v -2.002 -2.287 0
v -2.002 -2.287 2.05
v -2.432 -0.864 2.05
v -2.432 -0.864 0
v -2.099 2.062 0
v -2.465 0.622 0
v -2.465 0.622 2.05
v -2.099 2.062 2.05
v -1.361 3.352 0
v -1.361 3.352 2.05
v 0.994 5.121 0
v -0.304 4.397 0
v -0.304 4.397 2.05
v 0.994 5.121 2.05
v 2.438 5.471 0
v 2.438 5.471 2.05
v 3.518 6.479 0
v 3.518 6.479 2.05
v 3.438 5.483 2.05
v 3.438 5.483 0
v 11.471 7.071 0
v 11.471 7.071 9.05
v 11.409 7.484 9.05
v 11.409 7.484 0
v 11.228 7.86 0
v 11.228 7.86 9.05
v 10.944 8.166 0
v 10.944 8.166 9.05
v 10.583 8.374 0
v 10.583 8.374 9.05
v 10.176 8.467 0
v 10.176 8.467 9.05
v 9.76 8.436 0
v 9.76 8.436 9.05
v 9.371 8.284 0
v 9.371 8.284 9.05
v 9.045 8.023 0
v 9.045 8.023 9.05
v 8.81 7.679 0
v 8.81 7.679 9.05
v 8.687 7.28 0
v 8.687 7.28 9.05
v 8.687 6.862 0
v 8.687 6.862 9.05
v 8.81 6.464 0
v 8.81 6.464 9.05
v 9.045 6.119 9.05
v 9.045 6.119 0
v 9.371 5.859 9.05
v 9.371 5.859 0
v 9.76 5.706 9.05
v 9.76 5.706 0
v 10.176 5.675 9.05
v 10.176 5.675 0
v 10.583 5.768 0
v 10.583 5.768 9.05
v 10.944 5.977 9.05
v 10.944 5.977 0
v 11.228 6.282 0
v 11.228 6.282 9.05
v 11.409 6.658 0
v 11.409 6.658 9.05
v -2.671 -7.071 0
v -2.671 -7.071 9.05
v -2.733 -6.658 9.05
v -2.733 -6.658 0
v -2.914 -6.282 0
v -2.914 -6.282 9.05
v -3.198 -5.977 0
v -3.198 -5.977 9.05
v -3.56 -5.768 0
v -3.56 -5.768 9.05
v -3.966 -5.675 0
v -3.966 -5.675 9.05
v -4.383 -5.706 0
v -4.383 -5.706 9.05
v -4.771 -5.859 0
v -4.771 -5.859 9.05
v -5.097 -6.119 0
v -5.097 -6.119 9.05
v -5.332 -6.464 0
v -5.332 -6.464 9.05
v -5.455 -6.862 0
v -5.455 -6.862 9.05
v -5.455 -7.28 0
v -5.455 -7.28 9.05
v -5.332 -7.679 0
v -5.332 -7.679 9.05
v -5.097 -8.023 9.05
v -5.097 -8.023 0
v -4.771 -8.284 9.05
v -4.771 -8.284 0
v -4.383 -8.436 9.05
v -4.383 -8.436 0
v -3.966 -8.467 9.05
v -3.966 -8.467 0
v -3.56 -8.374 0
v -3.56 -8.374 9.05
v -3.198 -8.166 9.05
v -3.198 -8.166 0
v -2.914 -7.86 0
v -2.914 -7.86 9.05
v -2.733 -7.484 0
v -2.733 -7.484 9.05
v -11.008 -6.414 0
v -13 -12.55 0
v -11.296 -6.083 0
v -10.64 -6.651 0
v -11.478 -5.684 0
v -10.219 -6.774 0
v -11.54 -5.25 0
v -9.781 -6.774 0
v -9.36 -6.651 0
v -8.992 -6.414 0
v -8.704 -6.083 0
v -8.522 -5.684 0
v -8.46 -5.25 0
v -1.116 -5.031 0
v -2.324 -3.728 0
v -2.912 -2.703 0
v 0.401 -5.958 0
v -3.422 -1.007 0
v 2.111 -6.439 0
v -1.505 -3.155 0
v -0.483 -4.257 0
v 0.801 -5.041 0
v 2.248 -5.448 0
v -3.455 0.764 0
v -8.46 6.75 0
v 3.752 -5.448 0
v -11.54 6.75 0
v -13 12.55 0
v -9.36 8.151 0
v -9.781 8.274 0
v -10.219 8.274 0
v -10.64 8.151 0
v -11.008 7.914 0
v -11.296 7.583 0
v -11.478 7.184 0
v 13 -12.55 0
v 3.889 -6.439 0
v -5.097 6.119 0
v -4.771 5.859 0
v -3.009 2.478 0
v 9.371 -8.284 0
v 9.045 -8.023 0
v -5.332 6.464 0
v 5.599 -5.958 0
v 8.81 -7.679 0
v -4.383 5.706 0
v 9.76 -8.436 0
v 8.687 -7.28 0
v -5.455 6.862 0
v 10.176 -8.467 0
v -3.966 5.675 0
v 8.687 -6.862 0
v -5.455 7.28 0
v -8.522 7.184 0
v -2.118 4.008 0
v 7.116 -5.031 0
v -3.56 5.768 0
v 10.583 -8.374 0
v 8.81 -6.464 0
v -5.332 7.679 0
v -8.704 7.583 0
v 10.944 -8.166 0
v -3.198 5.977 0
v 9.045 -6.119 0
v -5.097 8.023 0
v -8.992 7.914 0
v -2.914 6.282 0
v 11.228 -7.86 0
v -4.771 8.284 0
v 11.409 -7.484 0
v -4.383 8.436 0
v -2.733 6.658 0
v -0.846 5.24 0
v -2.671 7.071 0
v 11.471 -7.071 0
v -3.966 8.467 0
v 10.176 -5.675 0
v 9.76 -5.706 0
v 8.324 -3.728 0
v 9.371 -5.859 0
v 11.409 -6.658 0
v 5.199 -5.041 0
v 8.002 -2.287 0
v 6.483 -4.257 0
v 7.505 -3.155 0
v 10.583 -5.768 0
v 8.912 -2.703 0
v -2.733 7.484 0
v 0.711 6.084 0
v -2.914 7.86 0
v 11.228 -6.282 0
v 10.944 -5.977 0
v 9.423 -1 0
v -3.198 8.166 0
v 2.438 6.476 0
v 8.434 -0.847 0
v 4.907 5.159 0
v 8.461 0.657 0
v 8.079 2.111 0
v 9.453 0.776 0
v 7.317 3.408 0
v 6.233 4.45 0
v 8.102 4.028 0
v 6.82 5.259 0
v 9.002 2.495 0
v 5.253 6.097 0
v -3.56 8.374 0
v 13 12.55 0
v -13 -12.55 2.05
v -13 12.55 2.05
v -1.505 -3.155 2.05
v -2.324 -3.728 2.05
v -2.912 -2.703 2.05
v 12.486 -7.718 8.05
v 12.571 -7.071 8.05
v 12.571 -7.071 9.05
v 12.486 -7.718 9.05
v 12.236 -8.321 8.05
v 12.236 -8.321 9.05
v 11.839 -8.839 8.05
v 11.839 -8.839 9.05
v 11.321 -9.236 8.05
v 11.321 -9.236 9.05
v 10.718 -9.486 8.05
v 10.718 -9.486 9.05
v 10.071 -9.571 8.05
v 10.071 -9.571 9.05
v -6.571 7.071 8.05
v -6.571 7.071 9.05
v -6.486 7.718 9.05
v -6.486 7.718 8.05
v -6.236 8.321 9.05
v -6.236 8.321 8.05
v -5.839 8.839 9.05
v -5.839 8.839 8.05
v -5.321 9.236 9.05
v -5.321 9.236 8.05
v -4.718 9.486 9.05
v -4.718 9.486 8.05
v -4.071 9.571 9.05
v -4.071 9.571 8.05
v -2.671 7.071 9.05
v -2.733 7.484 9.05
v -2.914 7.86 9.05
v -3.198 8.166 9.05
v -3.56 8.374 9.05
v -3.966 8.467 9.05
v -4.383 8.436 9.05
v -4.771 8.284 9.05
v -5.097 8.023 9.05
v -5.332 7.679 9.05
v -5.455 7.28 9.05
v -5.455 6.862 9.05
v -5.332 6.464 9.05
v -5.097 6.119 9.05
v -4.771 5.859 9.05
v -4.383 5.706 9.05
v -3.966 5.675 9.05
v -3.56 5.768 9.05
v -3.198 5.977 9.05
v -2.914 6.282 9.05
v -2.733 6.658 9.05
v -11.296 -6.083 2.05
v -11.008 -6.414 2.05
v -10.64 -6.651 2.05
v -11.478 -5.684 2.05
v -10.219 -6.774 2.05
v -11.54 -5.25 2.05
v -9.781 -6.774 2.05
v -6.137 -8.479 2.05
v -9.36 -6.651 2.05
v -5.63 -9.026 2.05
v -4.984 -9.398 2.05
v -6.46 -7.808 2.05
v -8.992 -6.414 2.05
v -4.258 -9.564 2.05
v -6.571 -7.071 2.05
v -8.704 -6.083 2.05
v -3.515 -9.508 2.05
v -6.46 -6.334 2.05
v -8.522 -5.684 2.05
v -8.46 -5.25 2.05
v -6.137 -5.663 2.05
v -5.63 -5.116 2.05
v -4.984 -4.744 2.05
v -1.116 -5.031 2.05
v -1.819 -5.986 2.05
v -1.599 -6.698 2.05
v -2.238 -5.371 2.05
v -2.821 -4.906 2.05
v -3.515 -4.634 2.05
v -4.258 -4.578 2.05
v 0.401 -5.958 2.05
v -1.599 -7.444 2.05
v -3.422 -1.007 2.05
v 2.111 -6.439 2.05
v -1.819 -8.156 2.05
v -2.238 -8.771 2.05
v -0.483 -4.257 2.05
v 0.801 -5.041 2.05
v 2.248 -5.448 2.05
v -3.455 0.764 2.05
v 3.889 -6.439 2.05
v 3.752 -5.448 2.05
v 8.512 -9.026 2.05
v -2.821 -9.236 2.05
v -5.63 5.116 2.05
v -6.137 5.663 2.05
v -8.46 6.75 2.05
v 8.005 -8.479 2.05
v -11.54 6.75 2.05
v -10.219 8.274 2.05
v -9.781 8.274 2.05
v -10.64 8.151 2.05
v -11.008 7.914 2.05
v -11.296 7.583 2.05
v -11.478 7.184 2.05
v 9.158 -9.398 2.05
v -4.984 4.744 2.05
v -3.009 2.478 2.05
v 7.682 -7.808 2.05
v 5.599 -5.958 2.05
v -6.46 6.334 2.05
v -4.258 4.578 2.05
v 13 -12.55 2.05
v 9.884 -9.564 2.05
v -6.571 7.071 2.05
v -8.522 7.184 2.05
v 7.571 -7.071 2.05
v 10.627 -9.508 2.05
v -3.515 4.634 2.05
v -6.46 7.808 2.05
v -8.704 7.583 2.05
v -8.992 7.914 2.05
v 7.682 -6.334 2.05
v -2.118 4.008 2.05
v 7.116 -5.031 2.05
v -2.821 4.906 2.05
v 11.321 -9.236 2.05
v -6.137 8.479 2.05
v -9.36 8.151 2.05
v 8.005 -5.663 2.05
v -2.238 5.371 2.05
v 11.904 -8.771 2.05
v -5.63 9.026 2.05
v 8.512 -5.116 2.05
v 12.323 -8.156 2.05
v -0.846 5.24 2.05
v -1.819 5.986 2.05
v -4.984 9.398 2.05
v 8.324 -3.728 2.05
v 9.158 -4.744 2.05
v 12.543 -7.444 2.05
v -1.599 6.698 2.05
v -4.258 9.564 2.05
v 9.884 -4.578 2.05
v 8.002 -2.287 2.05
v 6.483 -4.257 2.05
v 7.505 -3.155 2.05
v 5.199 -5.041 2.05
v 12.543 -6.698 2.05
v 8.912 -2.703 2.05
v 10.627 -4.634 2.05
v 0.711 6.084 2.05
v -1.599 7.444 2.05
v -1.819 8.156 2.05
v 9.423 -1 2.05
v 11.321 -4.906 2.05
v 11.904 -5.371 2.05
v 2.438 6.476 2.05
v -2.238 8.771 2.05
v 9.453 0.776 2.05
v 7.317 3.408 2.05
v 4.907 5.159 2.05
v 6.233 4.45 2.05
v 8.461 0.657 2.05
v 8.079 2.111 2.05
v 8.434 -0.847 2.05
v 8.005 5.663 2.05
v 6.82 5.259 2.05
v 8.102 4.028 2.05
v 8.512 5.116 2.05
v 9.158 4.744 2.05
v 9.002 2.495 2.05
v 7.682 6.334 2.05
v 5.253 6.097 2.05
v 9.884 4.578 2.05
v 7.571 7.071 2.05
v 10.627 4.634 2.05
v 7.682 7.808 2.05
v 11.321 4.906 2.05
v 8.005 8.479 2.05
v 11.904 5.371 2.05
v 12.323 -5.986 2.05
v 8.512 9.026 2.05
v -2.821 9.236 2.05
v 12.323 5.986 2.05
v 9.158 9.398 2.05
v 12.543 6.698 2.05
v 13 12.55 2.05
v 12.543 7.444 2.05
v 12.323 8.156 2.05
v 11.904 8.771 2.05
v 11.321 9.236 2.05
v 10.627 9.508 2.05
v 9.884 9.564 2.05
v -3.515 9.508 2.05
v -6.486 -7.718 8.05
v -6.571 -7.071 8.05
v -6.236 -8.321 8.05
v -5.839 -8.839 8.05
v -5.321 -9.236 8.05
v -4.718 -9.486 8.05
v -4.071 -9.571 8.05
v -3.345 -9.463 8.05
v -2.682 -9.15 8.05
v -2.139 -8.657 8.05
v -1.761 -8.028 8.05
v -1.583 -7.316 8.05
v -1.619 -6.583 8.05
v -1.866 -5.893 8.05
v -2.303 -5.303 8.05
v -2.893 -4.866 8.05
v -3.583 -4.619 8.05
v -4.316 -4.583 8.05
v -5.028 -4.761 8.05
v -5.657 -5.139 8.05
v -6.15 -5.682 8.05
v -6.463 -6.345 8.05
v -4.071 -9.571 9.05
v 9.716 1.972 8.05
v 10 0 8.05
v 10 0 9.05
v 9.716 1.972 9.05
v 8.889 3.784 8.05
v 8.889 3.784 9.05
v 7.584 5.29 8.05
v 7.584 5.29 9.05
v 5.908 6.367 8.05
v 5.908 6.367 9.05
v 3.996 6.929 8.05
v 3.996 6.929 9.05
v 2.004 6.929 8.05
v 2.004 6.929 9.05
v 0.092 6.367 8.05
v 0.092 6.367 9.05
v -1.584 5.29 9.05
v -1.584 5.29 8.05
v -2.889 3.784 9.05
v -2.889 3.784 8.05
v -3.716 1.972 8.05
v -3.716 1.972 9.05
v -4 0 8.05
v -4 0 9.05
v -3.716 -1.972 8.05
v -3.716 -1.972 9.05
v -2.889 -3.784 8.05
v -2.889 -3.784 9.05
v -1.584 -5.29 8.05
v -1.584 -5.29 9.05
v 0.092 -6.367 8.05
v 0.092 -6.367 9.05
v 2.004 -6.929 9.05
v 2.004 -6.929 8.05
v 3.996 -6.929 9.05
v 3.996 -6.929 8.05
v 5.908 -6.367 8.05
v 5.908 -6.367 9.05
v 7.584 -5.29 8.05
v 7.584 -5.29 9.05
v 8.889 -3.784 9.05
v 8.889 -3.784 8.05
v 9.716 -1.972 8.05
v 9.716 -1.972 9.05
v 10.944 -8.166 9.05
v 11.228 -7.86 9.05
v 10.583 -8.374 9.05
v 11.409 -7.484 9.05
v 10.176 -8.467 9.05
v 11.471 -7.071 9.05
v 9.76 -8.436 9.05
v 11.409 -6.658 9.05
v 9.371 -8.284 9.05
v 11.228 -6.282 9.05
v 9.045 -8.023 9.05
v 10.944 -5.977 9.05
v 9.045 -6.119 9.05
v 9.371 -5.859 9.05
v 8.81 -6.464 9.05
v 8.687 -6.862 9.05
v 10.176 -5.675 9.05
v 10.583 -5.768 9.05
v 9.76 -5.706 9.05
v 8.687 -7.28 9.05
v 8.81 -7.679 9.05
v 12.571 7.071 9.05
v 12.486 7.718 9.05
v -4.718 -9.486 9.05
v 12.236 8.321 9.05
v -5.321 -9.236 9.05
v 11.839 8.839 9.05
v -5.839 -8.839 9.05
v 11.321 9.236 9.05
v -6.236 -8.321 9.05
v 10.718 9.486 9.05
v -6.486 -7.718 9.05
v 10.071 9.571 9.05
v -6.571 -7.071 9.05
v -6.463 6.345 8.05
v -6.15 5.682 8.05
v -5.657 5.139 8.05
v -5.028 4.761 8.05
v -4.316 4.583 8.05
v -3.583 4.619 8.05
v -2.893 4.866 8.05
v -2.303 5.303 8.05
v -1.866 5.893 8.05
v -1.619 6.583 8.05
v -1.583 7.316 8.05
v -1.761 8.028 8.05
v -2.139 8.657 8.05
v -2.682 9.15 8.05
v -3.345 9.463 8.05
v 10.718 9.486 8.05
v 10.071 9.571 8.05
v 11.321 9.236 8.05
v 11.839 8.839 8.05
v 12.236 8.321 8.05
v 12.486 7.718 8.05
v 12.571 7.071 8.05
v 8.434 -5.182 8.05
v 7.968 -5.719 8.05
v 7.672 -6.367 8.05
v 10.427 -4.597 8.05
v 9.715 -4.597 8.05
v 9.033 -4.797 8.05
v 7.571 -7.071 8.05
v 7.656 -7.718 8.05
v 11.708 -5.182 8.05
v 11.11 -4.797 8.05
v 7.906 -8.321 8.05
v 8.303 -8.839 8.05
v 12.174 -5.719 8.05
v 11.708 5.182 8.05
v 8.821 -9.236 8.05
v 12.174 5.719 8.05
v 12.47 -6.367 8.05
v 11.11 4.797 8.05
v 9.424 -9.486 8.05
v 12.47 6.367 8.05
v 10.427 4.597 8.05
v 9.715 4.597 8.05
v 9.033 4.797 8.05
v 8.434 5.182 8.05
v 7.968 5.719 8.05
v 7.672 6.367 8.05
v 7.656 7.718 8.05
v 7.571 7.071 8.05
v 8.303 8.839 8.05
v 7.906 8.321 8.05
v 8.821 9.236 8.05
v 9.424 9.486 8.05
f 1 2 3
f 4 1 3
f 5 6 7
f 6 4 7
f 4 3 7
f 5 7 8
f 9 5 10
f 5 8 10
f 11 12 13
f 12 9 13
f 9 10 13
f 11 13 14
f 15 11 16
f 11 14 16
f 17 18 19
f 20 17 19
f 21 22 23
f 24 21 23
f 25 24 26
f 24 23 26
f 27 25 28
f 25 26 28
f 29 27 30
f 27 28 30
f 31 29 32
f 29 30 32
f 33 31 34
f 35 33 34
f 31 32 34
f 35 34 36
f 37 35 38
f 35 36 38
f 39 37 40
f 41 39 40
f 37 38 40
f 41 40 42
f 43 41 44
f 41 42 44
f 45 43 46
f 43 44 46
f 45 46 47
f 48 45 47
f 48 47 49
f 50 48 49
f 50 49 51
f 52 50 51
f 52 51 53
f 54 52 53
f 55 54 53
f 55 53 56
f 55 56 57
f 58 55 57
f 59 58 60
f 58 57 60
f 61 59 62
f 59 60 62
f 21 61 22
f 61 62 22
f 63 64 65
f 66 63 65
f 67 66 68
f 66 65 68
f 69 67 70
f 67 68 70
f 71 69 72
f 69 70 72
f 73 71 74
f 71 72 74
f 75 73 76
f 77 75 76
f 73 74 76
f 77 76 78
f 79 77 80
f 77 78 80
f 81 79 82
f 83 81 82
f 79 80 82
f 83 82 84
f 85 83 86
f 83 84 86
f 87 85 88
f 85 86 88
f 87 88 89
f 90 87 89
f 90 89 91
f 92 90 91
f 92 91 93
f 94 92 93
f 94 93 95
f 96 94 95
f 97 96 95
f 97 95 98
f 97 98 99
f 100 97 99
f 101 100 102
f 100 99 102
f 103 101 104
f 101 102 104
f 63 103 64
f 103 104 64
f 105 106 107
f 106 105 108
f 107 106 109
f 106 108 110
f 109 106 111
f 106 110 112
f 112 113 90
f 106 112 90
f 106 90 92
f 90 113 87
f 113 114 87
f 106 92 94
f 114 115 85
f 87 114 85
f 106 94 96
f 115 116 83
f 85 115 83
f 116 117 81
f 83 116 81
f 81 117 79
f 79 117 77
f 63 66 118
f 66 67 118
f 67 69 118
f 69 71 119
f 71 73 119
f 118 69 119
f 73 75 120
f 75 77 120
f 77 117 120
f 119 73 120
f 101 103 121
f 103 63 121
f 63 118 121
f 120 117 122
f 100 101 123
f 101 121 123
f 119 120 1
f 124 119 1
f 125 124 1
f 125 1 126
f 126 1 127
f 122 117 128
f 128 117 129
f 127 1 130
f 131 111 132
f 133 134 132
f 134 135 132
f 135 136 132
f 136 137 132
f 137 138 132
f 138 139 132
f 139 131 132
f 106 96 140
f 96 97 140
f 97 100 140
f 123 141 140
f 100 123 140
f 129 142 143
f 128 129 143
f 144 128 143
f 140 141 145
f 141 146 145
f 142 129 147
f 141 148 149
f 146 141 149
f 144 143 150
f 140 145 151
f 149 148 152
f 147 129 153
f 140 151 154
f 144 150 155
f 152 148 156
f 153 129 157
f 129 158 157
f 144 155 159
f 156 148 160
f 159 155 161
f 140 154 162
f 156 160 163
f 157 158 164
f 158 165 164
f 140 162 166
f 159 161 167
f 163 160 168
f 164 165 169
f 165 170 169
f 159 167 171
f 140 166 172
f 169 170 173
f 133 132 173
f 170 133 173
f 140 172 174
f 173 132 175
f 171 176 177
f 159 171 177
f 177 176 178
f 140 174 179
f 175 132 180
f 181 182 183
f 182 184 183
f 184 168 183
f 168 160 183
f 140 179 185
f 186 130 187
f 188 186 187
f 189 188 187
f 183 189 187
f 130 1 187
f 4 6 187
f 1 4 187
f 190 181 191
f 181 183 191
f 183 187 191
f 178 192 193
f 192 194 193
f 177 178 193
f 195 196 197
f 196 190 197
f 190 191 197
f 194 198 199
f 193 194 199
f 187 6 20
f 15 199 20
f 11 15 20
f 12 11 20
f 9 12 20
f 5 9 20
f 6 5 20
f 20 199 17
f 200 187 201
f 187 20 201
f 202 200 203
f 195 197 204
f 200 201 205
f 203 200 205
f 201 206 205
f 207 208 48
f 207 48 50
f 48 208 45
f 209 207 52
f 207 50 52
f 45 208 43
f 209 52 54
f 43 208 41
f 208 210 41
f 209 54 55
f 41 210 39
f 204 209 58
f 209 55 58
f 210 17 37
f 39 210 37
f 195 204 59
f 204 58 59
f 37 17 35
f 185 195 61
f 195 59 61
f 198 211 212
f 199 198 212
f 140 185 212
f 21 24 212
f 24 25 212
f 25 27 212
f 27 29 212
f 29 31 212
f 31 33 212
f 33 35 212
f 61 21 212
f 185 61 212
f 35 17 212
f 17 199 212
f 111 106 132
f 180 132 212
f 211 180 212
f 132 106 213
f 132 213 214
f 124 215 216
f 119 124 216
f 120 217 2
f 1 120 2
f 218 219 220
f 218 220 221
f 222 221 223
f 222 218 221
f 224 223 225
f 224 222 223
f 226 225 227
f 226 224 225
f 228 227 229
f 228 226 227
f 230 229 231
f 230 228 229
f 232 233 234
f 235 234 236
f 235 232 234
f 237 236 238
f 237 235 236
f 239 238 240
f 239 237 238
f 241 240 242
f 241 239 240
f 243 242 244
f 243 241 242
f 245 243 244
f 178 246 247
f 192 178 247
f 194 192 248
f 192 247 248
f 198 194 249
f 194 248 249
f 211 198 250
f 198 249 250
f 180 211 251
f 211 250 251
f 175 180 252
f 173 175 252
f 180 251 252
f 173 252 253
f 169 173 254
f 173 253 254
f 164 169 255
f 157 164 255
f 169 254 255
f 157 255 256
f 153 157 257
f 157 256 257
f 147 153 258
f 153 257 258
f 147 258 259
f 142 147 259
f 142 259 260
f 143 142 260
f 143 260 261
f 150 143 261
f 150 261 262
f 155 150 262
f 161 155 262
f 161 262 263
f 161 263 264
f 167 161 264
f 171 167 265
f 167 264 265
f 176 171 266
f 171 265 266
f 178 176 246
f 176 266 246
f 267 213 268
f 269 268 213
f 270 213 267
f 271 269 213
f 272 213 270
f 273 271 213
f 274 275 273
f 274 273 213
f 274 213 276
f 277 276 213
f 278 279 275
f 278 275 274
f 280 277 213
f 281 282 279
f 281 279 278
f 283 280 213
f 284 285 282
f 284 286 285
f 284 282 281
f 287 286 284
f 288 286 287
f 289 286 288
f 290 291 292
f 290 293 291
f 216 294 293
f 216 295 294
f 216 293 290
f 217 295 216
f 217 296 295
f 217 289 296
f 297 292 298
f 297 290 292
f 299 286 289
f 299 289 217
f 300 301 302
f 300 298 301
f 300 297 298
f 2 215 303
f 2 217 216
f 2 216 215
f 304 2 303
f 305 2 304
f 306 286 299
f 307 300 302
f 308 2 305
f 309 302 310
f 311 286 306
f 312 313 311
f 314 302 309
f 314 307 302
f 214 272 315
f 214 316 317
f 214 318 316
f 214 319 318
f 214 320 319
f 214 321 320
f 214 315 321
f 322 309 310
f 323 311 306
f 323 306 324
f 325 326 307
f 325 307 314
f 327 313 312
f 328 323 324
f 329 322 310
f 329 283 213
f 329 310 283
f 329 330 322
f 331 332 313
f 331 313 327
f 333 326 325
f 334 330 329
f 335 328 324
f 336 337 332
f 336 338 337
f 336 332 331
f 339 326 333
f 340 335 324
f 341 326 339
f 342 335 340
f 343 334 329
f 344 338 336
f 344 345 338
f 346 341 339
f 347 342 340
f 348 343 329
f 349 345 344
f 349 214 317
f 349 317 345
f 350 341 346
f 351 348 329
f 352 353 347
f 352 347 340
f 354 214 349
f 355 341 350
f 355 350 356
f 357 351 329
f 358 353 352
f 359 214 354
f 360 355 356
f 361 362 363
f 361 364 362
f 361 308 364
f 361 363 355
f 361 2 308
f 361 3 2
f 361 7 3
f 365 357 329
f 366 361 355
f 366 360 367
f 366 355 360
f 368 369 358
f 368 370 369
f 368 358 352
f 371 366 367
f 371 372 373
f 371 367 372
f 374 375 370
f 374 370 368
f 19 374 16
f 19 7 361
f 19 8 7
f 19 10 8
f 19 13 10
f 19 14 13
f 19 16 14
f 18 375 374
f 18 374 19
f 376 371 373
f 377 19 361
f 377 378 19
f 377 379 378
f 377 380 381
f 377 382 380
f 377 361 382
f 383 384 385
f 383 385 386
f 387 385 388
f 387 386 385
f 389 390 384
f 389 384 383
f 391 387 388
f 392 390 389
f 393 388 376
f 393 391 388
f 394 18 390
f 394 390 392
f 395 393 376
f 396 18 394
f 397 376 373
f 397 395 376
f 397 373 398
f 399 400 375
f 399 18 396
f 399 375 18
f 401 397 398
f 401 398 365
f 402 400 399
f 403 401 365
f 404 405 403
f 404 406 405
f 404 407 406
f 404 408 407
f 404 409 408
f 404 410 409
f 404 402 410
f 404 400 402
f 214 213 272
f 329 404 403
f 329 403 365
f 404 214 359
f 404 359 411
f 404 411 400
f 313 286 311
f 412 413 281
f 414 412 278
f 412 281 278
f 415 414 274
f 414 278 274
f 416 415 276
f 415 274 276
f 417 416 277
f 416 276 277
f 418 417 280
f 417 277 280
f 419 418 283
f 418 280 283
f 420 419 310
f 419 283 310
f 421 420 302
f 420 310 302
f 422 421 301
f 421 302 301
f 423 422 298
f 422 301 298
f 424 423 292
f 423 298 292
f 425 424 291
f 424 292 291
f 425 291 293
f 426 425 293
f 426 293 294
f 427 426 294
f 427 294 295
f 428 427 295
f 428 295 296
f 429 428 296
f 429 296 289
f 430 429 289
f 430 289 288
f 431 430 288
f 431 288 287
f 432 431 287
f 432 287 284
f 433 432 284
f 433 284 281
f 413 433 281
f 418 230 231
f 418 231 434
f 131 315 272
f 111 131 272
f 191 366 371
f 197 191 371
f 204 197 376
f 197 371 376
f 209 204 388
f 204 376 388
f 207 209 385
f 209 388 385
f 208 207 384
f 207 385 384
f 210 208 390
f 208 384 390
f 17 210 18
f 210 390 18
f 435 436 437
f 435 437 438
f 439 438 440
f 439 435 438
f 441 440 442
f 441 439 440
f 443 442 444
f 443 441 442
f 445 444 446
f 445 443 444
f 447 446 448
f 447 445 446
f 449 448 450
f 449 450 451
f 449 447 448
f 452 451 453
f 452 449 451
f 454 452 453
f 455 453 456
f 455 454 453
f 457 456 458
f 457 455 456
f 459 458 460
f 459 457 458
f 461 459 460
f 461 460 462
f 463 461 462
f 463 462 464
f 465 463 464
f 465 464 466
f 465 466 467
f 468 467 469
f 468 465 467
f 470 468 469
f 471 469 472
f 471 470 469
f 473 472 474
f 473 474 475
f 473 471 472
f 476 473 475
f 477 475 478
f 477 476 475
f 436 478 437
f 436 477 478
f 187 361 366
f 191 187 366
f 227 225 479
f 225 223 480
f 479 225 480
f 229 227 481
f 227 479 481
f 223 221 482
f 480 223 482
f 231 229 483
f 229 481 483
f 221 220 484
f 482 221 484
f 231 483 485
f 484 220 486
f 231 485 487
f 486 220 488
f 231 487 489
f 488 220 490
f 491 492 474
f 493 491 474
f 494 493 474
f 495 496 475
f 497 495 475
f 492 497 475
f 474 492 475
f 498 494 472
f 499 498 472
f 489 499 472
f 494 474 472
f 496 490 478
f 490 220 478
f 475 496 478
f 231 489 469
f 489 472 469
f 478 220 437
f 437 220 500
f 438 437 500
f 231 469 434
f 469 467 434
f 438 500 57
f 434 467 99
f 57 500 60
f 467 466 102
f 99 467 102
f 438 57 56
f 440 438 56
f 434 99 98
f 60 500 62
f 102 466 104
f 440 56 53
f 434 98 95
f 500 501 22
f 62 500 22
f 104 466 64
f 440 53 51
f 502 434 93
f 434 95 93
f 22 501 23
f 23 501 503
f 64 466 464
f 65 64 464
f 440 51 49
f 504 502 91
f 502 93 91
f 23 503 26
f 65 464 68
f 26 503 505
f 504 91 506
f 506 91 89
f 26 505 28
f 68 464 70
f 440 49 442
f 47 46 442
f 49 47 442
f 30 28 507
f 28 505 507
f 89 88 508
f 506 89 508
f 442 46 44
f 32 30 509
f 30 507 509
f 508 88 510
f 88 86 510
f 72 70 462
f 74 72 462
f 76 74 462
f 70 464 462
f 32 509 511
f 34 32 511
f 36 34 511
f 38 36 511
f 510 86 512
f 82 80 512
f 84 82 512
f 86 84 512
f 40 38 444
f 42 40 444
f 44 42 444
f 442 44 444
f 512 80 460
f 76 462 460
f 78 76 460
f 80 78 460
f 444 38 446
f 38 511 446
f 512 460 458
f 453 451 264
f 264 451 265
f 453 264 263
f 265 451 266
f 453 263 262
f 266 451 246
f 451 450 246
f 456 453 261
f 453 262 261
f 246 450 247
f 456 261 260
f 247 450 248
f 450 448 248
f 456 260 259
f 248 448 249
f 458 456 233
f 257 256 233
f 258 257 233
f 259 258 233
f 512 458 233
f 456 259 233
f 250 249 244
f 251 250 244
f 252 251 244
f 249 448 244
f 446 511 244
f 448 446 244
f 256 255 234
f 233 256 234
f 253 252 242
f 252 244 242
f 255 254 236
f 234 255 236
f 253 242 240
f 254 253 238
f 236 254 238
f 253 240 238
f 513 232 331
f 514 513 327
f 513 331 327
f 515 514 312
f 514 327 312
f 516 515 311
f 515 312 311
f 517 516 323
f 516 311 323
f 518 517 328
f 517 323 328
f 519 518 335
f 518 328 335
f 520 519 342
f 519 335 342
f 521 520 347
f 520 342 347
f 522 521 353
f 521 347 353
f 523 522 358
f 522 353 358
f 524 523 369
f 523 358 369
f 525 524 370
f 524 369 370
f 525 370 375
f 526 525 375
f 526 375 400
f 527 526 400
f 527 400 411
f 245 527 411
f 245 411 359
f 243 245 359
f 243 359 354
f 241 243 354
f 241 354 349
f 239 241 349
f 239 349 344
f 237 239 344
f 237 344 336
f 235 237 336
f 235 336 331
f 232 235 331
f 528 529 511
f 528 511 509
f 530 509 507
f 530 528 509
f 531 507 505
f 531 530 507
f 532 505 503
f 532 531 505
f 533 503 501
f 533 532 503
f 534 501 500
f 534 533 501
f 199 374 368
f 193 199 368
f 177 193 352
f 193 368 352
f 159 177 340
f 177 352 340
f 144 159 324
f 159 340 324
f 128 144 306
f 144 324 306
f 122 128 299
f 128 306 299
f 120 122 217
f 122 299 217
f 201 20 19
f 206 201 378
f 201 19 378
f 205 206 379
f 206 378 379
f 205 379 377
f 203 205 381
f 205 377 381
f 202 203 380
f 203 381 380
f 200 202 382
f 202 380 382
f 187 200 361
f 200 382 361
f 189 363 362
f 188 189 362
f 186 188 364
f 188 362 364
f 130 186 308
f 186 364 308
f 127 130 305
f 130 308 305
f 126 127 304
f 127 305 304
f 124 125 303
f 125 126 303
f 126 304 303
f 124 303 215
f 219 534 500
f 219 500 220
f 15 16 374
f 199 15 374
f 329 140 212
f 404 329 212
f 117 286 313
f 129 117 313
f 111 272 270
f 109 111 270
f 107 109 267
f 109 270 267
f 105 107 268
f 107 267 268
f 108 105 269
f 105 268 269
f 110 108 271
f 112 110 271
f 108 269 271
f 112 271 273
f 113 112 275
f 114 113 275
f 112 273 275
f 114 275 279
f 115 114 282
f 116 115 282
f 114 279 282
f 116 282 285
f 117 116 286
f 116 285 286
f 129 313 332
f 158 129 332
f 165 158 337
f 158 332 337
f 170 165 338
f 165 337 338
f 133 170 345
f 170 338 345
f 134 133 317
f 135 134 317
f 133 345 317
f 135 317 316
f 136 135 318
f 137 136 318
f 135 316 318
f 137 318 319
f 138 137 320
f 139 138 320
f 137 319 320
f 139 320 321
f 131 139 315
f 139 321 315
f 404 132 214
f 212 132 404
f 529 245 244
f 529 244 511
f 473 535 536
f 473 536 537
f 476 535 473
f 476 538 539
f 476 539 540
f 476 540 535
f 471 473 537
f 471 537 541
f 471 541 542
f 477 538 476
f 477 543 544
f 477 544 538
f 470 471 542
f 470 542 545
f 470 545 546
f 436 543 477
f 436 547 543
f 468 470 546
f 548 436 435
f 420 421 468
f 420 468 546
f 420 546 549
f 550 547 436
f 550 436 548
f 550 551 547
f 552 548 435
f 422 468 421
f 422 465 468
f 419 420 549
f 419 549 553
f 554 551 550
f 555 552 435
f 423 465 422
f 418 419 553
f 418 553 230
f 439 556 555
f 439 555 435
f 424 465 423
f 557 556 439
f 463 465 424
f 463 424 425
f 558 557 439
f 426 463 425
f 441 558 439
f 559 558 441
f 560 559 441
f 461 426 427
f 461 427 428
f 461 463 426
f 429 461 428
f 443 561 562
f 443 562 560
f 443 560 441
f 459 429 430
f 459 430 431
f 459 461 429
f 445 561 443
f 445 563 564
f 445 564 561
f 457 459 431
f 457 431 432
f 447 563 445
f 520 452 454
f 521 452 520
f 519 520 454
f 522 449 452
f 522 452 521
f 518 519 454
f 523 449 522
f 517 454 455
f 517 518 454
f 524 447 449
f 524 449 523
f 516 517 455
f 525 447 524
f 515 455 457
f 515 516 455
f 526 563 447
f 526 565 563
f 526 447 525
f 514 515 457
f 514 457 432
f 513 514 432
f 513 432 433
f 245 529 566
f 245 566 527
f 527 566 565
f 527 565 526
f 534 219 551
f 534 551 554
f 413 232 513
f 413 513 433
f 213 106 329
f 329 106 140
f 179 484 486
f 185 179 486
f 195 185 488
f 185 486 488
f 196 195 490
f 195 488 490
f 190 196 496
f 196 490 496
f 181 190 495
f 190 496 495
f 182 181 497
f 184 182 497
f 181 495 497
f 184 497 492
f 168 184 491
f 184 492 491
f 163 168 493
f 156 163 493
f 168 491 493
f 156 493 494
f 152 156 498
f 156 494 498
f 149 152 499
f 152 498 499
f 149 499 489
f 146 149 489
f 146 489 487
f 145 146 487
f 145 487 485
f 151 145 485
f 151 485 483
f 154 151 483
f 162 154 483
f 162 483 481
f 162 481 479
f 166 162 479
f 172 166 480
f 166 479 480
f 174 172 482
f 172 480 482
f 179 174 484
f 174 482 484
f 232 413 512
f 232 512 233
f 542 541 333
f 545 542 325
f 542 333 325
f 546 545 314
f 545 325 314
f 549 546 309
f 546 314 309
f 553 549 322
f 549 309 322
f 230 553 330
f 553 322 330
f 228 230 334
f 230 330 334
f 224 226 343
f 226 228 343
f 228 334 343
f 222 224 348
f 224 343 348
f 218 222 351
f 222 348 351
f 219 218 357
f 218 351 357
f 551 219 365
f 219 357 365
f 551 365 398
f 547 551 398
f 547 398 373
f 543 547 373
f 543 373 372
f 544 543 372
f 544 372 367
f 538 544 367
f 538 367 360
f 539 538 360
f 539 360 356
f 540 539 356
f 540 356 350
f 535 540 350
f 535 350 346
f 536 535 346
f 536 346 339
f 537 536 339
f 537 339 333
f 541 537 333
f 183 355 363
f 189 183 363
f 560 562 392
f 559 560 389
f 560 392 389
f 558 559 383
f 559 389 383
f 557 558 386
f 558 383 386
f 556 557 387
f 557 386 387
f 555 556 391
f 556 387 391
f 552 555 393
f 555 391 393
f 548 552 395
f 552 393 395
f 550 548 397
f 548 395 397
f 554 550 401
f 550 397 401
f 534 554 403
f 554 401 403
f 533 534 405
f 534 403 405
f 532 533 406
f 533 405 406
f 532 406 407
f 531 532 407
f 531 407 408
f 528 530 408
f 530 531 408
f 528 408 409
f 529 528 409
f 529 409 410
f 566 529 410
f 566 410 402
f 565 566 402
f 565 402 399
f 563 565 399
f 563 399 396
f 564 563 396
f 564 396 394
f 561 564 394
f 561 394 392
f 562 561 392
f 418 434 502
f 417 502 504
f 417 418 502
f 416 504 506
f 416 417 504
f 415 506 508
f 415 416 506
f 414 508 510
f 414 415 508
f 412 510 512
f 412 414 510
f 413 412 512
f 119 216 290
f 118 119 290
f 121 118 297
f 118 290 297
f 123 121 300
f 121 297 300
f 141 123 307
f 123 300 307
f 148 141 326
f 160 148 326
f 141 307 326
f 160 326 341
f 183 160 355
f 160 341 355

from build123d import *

# Parameters (mm, degrees)
SKETCH1_W           = 26
SKETCH1_H           = 25.1
BOSS_EXTRUDE1_DEPTH = 2.05
CUT_EXTRUDE1_DEPTH  = 19.185296258
SKETCH3_R           = 2.5
BOSS_EXTRUDE2_DEPTH = 6
SKETCH4_R           = 7
BOSS_EXTRUDE3_DEPTH = 1
SKETCH5_R           = 1.4
CUT_EXTRUDE2_DEPTH  = 9.05


with BuildPart() as part:
    # Sketch1 → Boss-Extrude1 (new body)
    with BuildSketch(Plane.XY):
        Rectangle(SKETCH1_W, SKETCH1_H)
    extrude(amount=BOSS_EXTRUDE1_DEPTH)

    # Sketch2 → Cut-Extrude1 (cut, through all)
    with BuildSketch(Plane.XY.offset(2.05)):
        with BuildLine():
            Line((-8.46, -5.25), (-8.46, 6.75))
            ThreePointArc((-8.46, 6.75), (-10, 8.29), (-11.54, 6.75))
            Line((-11.54, 6.75), (-11.54, -5.25))
            ThreePointArc((-11.54, -5.25), (-10, -6.79), (-8.46, -5.25))
        make_face()
        with BuildLine():
            ThreePointArc((-2.002069244, -2.286766992), (-1.773484699, 2.732003629), (2.438049628, 5.471216664))
            Line((2.438049628, 5.471216664), (2.438049628, 6.475663038))
            ThreePointArc((2.438049628, 6.475663038), (-2.615725538, 3.273167683), (-2.91153638, -2.702542808))
            Line((-2.91153638, -2.702542808), (-2.002069244, -2.286766992))
        make_face()
        with BuildLine():
            Line((3.517695015, 6.479351192), (3.438049628, 5.482527932))
            ThreePointArc((3.438049628, 5.482527932), (7.742278908, 2.785819585), (8.002069244, -2.286766992))
            Line((8.002069244, -2.286766992), (8.91153638, -2.702542808))
            ThreePointArc((8.91153638, -2.702542808), (8.604511436, 3.292332237), (3.517695015, 6.479351192))
        make_face()
        with BuildLine():
            ThreePointArc((7.505336244, -3.1546704), (3, -5.5), (-1.505336244, -3.1546704))
            Line((-1.505336244, -3.1546704), (-2.324488288, -3.728246836))
            ThreePointArc((-2.324488288, -3.728246836), (3, -6.5), (8.324488288, -3.728246836))
            Line((8.324488288, -3.728246836), (7.505336244, -3.1546704))
        make_face()
    extrude(amount=-CUT_EXTRUDE1_DEPTH, mode=Mode.SUBTRACT)

    # Sketch3 → Boss-Extrude2 (add)
    with BuildSketch(Plane.XY.offset(2.05)):
        with Locations(Location((-4.071067812, 7.071067812, 0), (0, 0, 180))):
            Circle(SKETCH3_R)
        with Locations(Location((10.071067812, 7.071067812, 0), (0, 0, 180))):
            Circle(SKETCH3_R)
        with Locations(Location((10.071067812, -7.071067812, 0), (0, 0, 180))):
            Circle(SKETCH3_R)
        with Locations(Location((-4.071067812, -7.071067812, 0), (0, 0, 180))):
            Circle(SKETCH3_R)
    extrude(amount=BOSS_EXTRUDE2_DEPTH)

    # Sketch4 → Boss-Extrude3 (add)
    with BuildSketch(Plane.XY.offset(8.05)):
        with BuildLine():
            Line((-4.071067812, 9.571067812), (10.071067812, 9.571067812))
            ThreePointArc((10.071067812, 9.571067812), (11.838834765, 8.838834765), (12.571067812, 7.071067812))
            Line((12.571067812, 7.071067812), (12.571067812, -7.071067812))
            ThreePointArc((12.571067812, -7.071067812), (11.838834765, -8.838834765), (10.071067812, -9.571067812))
            Line((10.071067812, -9.571067812), (-4.071067812, -9.571067812))
            ThreePointArc((-4.071067812, -9.571067812), (-5.838834765, -8.838834765), (-6.571067812, -7.071067812))
            Line((-6.571067812, -7.071067812), (-6.571067812, 7.071067812))
            ThreePointArc((-6.571067812, 7.071067812), (-5.838834765, 8.838834765), (-4.071067812, 9.571067812))
        make_face()
        with Locations((3, 0)):
            Circle(SKETCH4_R, mode=Mode.SUBTRACT)
    extrude(amount=BOSS_EXTRUDE3_DEPTH)

    # Sketch5 → Cut-Extrude2 (cut)
    with BuildSketch(Plane.XY.offset(9.05)):
        with Locations((-4.071067812, -7.071067812)):
            Circle(SKETCH5_R)
        with Locations((-4.071067812, 7.071067812)):
            Circle(SKETCH5_R)
        with Locations((10.071067812, 7.071067812)):
            Circle(SKETCH5_R)
        with Locations((10.071067812, -7.071067812)):
            Circle(SKETCH5_R)
    extrude(amount=-CUT_EXTRUDE2_DEPTH, mode=Mode.SUBTRACT)


solid = part.part
